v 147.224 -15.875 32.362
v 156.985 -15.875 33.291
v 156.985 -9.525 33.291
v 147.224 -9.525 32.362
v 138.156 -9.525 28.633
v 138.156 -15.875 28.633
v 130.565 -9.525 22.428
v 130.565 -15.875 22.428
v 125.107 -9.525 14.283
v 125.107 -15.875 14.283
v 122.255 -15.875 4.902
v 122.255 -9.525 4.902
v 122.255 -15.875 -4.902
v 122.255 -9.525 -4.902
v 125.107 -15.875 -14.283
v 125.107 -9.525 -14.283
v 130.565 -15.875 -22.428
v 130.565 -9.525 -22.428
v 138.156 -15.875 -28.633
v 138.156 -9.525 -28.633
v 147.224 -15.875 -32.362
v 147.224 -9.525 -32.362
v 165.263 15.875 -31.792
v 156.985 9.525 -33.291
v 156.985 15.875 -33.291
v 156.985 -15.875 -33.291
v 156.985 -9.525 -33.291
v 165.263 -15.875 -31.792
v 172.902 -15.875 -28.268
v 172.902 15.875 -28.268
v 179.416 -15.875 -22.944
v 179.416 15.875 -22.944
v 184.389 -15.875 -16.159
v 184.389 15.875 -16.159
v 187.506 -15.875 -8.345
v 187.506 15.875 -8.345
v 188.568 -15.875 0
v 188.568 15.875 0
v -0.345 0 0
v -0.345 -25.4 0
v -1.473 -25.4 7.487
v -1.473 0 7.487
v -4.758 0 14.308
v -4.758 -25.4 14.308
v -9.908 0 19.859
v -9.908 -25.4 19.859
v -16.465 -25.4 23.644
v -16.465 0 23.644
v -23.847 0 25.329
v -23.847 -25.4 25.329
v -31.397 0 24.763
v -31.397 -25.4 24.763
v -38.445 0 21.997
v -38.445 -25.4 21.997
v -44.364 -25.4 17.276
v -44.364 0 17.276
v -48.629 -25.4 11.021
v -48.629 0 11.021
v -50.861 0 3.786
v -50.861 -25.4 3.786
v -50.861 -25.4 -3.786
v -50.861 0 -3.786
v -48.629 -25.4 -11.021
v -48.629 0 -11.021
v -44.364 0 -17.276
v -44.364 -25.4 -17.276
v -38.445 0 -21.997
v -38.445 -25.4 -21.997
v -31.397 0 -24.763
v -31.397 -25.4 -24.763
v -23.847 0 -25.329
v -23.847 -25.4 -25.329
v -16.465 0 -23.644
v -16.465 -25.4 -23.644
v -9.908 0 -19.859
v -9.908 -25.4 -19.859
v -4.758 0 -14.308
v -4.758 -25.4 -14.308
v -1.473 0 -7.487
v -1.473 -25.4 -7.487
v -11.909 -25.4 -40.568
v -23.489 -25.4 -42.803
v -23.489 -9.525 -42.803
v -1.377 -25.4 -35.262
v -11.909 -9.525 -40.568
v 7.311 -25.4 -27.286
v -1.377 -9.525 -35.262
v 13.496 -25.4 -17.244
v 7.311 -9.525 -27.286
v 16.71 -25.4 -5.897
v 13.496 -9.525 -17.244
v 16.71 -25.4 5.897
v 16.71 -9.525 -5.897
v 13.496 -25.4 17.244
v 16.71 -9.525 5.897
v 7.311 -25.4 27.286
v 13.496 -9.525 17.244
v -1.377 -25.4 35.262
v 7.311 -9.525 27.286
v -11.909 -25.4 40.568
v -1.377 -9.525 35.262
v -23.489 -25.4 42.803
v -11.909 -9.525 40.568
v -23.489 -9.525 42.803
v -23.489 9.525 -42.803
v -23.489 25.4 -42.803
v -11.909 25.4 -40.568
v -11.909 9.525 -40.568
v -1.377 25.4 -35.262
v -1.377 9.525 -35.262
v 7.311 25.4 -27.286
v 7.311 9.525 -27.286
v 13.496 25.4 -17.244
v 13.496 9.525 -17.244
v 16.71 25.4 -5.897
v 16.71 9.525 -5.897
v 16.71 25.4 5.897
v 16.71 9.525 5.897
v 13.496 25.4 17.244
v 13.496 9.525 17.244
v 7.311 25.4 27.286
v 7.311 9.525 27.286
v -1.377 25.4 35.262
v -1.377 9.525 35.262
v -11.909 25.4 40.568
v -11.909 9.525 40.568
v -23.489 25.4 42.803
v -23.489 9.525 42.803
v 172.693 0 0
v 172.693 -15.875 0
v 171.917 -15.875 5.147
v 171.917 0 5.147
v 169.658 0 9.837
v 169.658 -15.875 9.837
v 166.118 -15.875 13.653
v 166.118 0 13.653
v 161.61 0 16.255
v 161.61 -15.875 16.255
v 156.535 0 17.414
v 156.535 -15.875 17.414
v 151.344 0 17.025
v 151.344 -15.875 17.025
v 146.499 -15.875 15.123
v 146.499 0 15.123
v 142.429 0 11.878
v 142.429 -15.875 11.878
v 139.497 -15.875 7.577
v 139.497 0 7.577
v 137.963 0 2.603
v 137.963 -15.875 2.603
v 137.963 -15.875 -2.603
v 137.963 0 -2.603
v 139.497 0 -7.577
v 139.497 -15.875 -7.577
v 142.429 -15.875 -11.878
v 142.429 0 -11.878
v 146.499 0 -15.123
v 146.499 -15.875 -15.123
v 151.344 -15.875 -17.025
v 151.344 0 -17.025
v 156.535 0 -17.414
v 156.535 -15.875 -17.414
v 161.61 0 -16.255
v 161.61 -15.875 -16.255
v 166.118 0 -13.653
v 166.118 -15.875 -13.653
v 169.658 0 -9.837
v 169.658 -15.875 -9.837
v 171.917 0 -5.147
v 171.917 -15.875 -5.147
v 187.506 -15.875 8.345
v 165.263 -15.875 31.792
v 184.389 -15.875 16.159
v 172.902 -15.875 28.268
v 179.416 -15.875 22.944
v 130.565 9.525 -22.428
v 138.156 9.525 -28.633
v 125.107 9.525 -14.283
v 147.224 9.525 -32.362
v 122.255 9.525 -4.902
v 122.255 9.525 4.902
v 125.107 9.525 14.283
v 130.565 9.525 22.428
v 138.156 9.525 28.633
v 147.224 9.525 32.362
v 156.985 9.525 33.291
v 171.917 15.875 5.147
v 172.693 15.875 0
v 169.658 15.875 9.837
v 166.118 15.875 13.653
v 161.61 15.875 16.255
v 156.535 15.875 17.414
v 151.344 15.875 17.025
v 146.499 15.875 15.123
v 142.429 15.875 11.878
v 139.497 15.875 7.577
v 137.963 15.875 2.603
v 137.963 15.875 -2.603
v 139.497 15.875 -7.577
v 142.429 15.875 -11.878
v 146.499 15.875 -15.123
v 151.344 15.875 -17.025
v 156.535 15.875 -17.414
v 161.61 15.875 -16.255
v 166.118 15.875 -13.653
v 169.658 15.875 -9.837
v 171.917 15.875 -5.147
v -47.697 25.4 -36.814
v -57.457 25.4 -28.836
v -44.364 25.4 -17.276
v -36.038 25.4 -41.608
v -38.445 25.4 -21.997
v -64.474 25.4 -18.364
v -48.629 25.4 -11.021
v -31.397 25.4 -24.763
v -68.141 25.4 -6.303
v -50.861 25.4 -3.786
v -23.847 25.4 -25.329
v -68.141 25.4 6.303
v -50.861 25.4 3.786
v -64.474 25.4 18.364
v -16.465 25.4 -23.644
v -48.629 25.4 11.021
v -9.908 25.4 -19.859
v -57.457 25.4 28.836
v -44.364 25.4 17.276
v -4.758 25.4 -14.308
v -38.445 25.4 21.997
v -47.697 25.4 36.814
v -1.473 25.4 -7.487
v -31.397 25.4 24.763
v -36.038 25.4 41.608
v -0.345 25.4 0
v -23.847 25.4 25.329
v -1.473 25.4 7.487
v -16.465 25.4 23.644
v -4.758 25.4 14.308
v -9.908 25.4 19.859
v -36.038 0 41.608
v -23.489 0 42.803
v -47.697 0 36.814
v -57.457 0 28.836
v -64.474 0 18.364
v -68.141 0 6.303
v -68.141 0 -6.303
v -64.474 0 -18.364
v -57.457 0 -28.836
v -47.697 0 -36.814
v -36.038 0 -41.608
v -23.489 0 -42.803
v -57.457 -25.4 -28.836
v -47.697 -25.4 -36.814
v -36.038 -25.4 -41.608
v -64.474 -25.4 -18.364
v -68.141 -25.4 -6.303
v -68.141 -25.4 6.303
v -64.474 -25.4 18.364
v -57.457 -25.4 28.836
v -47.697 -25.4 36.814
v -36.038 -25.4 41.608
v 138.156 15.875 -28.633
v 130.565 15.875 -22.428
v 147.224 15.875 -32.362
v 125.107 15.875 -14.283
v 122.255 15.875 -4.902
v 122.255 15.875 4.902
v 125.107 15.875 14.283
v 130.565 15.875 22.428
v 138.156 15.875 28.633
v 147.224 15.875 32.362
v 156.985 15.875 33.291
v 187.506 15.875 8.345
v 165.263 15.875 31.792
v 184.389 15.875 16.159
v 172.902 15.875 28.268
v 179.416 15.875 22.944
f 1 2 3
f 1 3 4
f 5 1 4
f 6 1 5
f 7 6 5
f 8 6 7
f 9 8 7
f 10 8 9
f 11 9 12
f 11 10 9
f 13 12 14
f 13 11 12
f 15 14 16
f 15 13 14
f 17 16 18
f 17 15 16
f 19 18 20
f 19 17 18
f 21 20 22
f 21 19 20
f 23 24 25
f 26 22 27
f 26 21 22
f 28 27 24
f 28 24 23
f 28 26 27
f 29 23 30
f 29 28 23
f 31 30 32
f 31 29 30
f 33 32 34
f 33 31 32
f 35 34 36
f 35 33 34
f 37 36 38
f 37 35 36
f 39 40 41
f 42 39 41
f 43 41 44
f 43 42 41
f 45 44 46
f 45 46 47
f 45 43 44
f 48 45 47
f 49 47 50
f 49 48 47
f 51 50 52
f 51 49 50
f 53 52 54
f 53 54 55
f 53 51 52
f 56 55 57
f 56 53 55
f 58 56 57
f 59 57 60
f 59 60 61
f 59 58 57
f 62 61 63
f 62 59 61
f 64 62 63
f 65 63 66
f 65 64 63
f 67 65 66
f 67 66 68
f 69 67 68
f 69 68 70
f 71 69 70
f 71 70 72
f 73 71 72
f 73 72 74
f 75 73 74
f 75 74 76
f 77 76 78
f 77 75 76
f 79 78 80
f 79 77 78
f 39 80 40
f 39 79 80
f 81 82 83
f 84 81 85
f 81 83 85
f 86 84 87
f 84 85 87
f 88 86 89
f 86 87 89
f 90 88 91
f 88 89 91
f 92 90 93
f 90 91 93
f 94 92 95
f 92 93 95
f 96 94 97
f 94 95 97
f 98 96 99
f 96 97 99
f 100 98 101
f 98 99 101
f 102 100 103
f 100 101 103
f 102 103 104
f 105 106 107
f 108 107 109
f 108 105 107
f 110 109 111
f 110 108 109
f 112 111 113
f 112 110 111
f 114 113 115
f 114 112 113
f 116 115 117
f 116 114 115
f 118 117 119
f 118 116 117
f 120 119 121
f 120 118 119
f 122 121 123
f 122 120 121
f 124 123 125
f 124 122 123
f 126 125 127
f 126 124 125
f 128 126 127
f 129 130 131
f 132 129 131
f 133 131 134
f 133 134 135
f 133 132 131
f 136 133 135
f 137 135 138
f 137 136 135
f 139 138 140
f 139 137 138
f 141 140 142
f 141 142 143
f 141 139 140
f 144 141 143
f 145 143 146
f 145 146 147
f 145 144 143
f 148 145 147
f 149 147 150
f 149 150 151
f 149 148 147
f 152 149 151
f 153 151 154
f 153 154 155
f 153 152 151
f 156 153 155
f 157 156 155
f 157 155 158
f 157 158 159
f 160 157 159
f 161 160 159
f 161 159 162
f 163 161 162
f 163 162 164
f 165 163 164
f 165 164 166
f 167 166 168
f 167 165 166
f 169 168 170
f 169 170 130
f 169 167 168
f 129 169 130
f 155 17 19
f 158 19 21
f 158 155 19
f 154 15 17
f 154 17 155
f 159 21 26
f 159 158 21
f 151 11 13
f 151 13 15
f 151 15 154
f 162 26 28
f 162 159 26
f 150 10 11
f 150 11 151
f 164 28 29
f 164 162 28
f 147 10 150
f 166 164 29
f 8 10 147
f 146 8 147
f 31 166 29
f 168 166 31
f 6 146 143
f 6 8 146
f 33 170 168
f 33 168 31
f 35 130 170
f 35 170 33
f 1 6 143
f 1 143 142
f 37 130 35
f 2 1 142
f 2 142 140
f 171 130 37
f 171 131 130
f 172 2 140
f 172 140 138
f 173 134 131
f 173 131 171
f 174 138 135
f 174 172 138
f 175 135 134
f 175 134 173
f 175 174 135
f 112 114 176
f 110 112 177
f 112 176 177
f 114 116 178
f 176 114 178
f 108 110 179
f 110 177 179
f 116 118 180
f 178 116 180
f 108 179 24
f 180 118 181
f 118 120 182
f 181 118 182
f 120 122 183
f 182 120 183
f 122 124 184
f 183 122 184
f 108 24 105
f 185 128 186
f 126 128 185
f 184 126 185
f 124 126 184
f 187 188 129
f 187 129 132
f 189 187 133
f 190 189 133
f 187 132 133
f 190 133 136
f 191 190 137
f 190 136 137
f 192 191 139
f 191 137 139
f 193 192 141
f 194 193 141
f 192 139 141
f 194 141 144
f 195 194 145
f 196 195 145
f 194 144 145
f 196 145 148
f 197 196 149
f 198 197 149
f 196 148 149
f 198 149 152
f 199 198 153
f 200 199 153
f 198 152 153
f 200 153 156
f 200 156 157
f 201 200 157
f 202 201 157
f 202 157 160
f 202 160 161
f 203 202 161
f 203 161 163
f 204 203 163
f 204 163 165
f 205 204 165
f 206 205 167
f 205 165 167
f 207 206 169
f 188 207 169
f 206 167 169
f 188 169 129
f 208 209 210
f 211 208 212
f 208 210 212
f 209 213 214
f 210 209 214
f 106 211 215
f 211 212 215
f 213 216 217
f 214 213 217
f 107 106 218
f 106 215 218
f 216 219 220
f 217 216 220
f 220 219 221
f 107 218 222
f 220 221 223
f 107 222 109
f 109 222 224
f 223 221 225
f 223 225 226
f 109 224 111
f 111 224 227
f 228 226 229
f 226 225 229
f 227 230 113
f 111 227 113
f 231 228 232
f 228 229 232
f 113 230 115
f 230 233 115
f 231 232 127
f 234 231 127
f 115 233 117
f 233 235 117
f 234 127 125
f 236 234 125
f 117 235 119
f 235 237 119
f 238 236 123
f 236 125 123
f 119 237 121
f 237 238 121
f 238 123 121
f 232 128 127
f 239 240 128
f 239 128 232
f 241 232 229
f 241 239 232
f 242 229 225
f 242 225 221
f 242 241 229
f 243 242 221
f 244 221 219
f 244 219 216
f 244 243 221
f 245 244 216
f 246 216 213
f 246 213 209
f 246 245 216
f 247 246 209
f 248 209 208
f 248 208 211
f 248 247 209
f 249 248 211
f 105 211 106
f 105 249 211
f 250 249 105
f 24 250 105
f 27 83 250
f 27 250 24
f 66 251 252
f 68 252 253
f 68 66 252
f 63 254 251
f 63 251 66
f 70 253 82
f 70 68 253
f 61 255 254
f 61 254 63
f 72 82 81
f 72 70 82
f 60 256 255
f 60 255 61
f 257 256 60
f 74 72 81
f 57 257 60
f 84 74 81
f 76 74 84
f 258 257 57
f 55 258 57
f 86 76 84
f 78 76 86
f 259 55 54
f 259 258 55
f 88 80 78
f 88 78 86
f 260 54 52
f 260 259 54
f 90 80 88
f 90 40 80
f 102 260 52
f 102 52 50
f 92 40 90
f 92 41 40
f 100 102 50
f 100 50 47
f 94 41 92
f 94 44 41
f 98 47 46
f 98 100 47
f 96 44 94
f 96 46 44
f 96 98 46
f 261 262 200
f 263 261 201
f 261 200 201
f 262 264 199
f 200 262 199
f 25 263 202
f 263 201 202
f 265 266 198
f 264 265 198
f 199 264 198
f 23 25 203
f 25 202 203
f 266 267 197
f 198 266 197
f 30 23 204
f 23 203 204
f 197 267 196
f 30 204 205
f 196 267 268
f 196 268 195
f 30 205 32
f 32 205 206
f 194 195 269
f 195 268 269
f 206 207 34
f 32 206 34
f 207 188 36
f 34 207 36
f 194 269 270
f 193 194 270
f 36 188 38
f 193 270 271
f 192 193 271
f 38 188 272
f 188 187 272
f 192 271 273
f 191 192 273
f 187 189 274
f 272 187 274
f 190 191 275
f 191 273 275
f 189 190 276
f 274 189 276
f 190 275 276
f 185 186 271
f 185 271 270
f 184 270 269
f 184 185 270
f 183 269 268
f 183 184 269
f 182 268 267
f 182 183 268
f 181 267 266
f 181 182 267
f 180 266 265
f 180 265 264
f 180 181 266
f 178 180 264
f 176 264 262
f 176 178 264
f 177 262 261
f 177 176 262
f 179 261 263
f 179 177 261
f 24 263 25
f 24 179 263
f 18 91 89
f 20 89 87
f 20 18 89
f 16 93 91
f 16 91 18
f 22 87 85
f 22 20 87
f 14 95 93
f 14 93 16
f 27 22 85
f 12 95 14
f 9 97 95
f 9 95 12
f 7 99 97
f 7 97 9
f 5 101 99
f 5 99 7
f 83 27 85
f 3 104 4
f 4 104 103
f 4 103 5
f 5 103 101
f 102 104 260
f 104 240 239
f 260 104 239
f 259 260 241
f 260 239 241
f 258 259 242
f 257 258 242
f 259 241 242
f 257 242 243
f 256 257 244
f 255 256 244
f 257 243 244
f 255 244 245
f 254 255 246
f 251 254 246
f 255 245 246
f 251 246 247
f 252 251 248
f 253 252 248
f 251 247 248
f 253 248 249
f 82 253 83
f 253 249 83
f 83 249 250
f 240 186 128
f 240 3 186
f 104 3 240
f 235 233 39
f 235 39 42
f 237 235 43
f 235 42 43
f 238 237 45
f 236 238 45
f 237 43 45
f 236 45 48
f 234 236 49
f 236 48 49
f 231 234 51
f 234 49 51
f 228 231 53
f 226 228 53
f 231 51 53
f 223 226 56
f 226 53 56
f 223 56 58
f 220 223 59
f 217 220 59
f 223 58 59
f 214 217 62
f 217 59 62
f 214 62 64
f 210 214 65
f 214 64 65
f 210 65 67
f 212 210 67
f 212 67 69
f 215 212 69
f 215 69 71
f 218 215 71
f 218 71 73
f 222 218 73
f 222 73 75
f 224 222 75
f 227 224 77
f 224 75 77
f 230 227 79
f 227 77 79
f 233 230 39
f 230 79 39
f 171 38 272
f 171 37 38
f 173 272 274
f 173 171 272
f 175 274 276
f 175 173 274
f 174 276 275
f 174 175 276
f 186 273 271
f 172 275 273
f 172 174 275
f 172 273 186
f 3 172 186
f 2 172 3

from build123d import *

# Parameters (mm, degrees)
F1_DEPTH = 9.525
F0_R     = 25.4
F2_DEPTH = 25.4
F0_R_2   = 17.4625
F3_DEPTH = 15.875


with BuildPart() as f1:
    # F0 (on Front) → F1 (new body, symmetric)
    with BuildSketch(Plane.XZ):
        with BuildLine():
            ThreePointArc((-23.4888751152, 42.803092487), (5.3509296025, 29.4999956791), (17.1177038322, 0))
            ThreePointArc((17.1177038322, 0), (5.3509296025, -29.4999956791), (-23.4888751152, -42.803092487))
            Line((-23.4888751152, -42.803092487), (156.9848090954, -33.2912941566))
            ThreePointArc((156.9848090954, -33.2912941566), (121.8927038322, 0), (156.9848090954, 33.2912941566))
            Line((156.9848090954, 33.2912941566), (-23.4888751152, 42.803092487))
        make_face()
    extrude(amount=F1_DEPTH, both=True)

    # F0 (on Front) → F2 (join, symmetric)
    with BuildSketch(Plane.XZ):
        with BuildLine():
            ThreePointArc((-23.4888751152, -42.803092487), (5.3509296025, -29.4999956791), (17.1177038322, 0))
            ThreePointArc((17.1177038322, 0), (5.3509296025, 29.4999956791), (-23.4888751152, 42.803092487))
            ThreePointArc((-23.4888751152, 42.803092487), (-68.6072961678, 0), (-23.4888751152, -42.803092487))
        make_face()
        with Locations((-25.7447961678, 0)):
            Circle(F0_R, mode=Mode.SUBTRACT)
    extrude(amount=F2_DEPTH, both=True)

    # F0 (on Front) → F3 (join, symmetric)
    with BuildSketch(Plane.XZ):
        with BuildLine():
            ThreePointArc((188.5677038322, 0), (179.4157683202, 22.9444410837), (156.9848090954, 33.2912941566))
            ThreePointArc((156.9848090954, 33.2912941566), (121.8927038322, 0), (156.9848090954, -33.2912941566))
            ThreePointArc((156.9848090954, -33.2912941566), (179.4157683202, -22.9444410837), (188.5677038322, 0))
        make_face()
        with Locations((155.2302038322, 0)):
            Circle(F0_R_2, mode=Mode.SUBTRACT)
    extrude(amount=F3_DEPTH, both=True)


solid = f1.part
